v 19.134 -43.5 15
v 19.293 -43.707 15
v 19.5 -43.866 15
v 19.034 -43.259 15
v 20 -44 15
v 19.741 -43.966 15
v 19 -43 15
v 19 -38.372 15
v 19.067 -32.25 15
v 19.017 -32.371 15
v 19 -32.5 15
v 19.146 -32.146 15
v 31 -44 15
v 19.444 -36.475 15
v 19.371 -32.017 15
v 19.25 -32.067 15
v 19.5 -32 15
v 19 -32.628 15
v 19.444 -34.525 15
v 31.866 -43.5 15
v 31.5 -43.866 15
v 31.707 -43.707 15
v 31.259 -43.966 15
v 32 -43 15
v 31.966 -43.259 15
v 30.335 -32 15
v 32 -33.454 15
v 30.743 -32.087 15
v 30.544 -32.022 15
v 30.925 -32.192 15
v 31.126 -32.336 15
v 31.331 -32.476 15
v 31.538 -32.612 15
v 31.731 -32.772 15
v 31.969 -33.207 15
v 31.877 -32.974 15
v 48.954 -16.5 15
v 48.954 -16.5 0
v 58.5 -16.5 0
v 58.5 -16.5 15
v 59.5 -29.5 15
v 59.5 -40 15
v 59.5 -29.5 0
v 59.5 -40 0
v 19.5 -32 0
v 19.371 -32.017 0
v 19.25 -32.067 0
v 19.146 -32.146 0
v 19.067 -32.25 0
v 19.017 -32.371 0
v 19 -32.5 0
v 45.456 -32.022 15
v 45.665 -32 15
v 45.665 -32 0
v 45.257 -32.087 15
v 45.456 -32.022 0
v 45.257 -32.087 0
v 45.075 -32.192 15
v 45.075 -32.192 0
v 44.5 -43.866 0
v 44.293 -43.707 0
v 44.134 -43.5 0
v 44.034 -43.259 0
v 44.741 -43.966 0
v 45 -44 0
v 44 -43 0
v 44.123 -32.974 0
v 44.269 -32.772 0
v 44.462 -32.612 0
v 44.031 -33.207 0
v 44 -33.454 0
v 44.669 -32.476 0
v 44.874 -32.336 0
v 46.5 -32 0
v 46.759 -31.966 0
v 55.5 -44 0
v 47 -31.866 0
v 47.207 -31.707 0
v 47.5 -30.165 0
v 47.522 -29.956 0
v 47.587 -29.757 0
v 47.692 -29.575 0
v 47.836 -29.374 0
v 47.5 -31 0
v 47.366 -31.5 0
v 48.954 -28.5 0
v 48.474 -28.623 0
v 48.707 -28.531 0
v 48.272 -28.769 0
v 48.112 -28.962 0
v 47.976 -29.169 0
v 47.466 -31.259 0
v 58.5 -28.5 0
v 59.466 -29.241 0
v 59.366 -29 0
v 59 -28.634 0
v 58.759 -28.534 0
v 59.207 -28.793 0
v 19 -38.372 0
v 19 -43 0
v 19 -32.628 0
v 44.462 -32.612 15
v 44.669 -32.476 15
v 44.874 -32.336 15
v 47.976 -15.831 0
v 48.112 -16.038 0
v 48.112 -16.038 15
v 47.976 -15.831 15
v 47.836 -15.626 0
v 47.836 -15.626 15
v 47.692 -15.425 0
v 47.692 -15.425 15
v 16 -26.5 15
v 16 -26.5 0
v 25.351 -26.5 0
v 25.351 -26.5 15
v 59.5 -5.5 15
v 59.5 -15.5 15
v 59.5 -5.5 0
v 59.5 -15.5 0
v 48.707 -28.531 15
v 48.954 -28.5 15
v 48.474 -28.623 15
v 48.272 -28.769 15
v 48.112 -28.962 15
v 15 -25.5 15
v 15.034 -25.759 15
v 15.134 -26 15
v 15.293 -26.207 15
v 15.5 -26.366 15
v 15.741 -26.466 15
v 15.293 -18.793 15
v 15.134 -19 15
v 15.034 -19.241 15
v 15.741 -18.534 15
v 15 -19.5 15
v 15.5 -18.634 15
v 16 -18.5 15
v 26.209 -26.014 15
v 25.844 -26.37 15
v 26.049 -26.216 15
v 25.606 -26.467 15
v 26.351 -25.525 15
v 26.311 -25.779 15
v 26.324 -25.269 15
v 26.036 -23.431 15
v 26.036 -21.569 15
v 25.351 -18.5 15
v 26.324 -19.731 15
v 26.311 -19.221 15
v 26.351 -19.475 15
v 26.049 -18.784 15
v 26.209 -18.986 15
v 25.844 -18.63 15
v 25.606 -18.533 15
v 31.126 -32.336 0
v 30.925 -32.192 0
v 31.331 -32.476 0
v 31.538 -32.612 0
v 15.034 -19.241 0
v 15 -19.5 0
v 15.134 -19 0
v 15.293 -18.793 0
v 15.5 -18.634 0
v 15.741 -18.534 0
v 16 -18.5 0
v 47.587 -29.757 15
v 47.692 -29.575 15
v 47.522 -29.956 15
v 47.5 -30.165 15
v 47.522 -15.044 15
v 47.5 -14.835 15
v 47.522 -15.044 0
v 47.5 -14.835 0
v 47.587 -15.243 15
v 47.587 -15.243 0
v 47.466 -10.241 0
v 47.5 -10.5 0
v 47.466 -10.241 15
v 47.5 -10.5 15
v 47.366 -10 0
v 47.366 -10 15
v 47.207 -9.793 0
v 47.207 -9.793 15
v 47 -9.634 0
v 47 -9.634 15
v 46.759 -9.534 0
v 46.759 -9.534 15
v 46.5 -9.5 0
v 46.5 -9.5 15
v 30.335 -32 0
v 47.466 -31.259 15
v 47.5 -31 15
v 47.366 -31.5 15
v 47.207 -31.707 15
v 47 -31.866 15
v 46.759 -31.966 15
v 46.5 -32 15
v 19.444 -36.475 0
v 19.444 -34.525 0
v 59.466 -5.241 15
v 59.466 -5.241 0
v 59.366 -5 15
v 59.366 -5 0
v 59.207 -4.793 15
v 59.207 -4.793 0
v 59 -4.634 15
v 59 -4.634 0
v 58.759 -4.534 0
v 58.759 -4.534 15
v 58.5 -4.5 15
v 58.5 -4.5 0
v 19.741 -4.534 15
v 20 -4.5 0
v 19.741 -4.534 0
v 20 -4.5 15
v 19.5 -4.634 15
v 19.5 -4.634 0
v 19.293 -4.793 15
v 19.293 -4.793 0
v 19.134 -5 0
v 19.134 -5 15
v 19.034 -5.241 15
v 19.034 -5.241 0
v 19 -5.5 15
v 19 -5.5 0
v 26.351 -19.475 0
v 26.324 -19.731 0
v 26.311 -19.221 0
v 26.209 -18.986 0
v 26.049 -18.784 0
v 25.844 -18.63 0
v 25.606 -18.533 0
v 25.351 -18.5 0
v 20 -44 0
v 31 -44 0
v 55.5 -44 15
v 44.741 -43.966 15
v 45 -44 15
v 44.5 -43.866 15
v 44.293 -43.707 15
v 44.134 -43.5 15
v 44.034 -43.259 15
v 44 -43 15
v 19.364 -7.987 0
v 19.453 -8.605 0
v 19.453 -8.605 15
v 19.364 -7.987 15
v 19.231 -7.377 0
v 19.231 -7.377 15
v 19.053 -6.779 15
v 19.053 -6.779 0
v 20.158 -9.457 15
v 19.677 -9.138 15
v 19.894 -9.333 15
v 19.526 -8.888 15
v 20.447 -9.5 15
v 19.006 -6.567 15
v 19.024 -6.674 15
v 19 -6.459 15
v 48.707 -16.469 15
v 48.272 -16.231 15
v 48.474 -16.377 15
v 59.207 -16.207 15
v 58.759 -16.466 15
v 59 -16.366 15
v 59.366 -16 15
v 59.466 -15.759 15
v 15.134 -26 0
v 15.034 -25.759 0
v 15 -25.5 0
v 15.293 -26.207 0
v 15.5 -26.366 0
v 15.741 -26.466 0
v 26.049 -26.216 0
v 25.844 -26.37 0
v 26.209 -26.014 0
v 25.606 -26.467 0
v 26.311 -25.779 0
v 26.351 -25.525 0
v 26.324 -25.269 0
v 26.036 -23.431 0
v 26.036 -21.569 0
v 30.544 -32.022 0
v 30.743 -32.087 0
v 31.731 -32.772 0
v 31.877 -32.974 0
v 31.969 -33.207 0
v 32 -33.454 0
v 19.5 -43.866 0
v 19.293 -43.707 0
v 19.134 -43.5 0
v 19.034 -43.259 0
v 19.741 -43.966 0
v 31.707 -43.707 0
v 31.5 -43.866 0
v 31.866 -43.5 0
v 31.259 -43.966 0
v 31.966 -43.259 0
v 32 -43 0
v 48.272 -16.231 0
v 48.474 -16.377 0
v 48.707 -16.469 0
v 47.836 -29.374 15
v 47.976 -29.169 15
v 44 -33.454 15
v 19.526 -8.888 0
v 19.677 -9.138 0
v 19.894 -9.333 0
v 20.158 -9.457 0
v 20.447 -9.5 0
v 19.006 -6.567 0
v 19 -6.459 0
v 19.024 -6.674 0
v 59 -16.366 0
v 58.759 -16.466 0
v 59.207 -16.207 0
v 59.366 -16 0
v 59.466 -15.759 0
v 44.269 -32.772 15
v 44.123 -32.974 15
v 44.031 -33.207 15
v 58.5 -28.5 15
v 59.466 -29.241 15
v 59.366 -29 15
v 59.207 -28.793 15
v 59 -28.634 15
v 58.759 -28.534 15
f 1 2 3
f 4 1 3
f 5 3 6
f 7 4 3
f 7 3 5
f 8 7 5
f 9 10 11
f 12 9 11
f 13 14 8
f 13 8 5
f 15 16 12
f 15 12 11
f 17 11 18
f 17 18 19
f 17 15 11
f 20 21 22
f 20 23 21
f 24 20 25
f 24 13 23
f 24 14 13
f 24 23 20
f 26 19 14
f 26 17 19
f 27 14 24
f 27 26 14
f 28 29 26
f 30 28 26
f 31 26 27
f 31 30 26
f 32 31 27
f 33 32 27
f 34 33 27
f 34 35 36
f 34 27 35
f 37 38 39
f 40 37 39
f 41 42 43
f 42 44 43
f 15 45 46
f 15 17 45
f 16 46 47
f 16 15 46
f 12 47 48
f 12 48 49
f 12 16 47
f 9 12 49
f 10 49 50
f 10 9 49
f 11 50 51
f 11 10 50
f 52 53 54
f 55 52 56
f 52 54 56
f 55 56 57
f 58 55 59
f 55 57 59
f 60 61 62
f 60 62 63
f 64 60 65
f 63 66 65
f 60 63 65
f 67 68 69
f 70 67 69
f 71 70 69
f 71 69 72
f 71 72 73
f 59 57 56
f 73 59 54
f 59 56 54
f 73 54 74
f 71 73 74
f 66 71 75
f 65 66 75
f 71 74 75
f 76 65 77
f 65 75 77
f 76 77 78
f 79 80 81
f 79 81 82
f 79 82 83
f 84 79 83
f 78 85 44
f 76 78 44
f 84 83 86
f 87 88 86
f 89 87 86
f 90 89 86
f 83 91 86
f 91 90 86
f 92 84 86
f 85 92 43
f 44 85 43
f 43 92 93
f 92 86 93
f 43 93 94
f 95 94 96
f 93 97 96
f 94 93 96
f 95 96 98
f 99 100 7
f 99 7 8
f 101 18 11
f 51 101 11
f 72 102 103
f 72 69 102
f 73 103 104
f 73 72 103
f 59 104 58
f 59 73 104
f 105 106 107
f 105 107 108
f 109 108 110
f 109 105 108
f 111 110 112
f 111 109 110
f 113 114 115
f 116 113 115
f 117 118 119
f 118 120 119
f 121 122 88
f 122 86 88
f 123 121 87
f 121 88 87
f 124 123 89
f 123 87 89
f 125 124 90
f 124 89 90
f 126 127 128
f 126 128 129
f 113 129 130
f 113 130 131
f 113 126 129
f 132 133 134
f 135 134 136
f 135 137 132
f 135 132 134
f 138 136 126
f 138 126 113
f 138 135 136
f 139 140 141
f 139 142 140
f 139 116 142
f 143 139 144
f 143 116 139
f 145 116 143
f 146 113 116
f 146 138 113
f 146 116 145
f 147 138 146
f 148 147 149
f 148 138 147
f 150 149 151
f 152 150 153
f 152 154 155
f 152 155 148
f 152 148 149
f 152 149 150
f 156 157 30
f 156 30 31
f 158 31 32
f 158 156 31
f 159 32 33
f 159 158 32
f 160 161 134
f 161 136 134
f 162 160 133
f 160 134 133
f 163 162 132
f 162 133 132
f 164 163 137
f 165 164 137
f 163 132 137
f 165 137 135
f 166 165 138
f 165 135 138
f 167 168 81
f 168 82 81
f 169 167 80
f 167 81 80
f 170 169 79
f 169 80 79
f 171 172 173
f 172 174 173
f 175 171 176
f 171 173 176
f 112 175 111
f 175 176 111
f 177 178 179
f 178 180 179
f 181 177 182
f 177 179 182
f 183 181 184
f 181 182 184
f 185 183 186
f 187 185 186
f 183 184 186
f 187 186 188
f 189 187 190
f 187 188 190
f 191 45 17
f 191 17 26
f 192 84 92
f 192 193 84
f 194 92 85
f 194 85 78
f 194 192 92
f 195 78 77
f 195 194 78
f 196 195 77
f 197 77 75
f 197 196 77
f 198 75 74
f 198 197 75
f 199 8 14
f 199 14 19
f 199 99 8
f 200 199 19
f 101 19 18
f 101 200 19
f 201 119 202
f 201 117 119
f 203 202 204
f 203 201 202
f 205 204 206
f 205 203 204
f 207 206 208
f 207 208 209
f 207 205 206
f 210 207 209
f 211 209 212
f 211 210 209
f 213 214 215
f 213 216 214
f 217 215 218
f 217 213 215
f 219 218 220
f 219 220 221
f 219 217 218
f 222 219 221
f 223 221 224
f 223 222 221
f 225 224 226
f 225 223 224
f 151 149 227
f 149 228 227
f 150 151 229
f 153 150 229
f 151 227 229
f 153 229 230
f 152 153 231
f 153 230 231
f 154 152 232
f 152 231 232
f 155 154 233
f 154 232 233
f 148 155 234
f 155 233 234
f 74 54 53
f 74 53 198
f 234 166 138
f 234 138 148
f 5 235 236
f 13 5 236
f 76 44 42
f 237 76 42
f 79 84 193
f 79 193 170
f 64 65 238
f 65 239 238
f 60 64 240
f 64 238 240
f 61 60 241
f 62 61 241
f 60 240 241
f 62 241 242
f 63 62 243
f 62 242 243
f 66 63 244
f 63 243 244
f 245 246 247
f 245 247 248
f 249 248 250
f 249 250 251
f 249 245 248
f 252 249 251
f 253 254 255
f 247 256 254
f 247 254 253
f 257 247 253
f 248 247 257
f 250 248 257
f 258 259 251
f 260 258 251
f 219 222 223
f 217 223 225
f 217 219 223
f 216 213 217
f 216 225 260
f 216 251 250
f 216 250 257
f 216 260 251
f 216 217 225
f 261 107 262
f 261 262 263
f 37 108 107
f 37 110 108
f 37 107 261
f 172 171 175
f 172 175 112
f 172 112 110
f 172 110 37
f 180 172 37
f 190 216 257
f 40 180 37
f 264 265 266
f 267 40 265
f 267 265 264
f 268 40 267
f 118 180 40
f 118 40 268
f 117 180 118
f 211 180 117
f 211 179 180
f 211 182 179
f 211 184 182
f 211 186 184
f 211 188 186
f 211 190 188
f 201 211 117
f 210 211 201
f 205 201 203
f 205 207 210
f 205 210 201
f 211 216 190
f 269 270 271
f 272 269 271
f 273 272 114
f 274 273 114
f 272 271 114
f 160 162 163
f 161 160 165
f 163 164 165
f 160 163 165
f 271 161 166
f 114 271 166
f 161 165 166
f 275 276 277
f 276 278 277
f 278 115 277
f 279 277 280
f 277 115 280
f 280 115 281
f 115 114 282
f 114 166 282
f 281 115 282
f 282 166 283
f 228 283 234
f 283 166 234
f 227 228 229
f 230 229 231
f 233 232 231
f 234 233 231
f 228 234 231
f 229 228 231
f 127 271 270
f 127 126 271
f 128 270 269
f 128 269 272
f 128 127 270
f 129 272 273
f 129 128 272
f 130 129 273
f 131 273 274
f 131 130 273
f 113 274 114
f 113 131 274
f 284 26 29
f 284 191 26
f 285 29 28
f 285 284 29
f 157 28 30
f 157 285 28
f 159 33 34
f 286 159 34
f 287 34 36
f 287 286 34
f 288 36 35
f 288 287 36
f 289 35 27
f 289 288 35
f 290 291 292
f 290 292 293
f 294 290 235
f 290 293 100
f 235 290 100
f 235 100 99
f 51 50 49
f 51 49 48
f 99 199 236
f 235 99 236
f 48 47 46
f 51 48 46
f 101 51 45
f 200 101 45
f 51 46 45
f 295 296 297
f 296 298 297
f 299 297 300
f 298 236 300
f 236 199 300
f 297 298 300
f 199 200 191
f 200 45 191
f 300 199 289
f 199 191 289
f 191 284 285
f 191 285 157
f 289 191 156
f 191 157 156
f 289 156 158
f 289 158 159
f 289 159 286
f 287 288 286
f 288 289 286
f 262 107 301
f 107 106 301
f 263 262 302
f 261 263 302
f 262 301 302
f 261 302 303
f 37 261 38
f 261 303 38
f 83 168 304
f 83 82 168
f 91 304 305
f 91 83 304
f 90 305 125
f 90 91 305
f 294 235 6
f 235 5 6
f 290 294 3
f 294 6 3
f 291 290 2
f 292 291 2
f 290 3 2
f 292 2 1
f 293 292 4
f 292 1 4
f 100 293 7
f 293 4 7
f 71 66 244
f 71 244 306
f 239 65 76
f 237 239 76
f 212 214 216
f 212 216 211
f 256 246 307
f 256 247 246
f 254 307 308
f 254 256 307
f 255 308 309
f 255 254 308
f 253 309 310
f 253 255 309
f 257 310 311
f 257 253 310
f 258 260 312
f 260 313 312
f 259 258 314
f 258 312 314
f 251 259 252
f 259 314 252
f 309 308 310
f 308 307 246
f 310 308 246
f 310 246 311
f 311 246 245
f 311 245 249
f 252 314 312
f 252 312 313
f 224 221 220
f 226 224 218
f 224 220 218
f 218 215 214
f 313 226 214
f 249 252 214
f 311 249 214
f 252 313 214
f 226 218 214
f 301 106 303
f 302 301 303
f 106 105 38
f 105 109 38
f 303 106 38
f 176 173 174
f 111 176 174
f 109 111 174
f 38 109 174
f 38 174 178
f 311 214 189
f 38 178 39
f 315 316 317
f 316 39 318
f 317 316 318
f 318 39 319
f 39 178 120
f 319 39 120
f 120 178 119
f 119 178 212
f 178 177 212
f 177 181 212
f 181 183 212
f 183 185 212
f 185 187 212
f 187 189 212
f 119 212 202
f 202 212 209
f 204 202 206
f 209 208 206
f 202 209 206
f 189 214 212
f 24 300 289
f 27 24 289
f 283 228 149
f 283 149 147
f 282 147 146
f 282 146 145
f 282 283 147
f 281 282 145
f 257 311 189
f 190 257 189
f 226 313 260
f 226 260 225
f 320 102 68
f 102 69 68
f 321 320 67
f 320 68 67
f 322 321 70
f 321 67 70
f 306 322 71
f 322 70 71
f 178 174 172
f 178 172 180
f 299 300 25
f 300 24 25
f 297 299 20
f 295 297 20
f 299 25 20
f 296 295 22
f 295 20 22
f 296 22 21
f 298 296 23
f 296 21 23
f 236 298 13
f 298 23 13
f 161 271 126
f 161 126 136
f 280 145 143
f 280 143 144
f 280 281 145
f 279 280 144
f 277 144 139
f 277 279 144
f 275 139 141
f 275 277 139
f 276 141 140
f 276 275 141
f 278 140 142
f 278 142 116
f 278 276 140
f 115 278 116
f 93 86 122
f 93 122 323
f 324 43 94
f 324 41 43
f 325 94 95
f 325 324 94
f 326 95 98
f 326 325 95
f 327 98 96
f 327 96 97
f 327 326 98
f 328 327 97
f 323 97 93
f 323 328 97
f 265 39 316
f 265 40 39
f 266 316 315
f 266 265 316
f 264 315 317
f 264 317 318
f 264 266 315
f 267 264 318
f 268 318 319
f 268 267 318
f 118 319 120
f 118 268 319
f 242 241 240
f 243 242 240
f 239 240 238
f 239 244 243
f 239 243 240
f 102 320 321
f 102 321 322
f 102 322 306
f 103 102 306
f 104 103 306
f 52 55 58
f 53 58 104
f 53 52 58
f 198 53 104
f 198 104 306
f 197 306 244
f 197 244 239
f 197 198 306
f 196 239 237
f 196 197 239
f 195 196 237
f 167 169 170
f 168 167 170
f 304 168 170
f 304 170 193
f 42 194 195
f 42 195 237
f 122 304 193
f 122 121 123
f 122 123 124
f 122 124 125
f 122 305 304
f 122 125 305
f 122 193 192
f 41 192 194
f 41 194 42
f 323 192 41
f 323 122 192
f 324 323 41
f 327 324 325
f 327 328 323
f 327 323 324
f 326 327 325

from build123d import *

# Parameters (mm, degrees)
CYLINDER069_R     = 8.5
CYLINDER069_DEPTH = 15
CYLINDER071_R     = 8.5
CYLINDER071_DEPTH = 15
CYLINDER070_R     = 12
CYLINDER070_DEPTH = 15
BOX015_W          = 12
BOX015_H          = 7
BOX015_DEPTH      = 15
BOX014_W          = 12
BOX014_H          = 3.5
BOX014_DEPTH      = 15
BOX012_W          = 15.5
BOX012_H          = 12
BOX012_DEPTH      = 15
CHAMFER012_SIZE   = 4
BOX011_W          = 13
BOX011_H          = 12
BOX011_DEPTH      = 15
BOX016_W          = 14.5
BOX016_H          = 8
BOX016_DEPTH      = 15
BOX013_W          = 40.5
BOX013_H          = 5
BOX013_DEPTH      = 15
FILLET003_R       = 0.5
FILLET004_R       = 1


with BuildPart() as cylinder069:
    # Cylinder069 → Cylinder069 (new body)
    with BuildSketch(Plane(origin=(11, -35.5, 0), x_dir=(1, 0, 0), z_dir=(0, 0, 1))):
        Circle(CYLINDER069_R)
    extrude(amount=CYLINDER069_DEPTH)


with BuildPart() as cylinder071:
    # Cylinder071 → Cylinder071 (new body)
    with BuildSketch(Plane(origin=(11, -9.5, 0), x_dir=(1, 0, 0), z_dir=(0, 0, 1))):
        Circle(CYLINDER071_R)
    extrude(amount=CYLINDER071_DEPTH)


with BuildPart() as fusion006002011004053036004001003011:
    # Cylinder070 → Cylinder070 (new body)
    with BuildSketch(Plane(origin=(38, -22.5, 0), x_dir=(1, 0, 0), z_dir=(0, 0, 1))):
        Circle(CYLINDER070_R)
    extrude(amount=CYLINDER070_DEPTH)

    # Fusion006002011004053036004001003011: union Cylinder069, Cylinder071
    add(cylinder069.part)
    add(cylinder071.part)


with BuildPart() as cube015:
    # Box015 → Box015 (new body)
    with BuildSketch(Plane(origin=(47.5, -16.5, 0), x_dir=(1, 0, 0), z_dir=(0, 0, 1))):
        with Locations((6, 3.5)):
            Rectangle(BOX015_W, BOX015_H)
    extrude(amount=BOX015_DEPTH)


with BuildPart() as cube014:
    # Box014 → Box014 (new body)
    with BuildSketch(Plane(origin=(47.5, -32, 0), x_dir=(1, 0, 0), z_dir=(0, 0, 1))):
        with Locations((6, 1.75)):
            Rectangle(BOX014_W, BOX014_H)
    extrude(amount=BOX014_DEPTH)


with BuildPart() as chamfer012:
    # Box012 → Box012 (new body)
    with BuildSketch(Plane(origin=(44, -44, 0), x_dir=(1, 0, 0), z_dir=(0, 0, 1))):
        with Locations((7.75, 6)):
            Rectangle(BOX012_W, BOX012_H)
    extrude(amount=BOX012_DEPTH)

    # Chamfer012
    chamfer012_edges = [chamfer012.edges().sort_by_distance(p)[0] for p in [
        (59.5, -44, 7.5),
    ]]
    chamfer(chamfer012_edges, length=CHAMFER012_SIZE)


with BuildPart() as cube011:
    # Box011 → Box011 (new body)
    with BuildSketch(Plane(origin=(19, -44, 0), x_dir=(1, 0, 0), z_dir=(0, 0, 1))):
        with Locations((6.5, 6)):
            Rectangle(BOX011_W, BOX011_H)
    extrude(amount=BOX011_DEPTH)


with BuildPart() as cube016:
    # Box016 → Box016 (new body)
    with BuildSketch(Plane(origin=(15, -26.5, 0), x_dir=(1, 0, 0), z_dir=(0, 0, 1))):
        with Locations((7.25, 4)):
            Rectangle(BOX016_W, BOX016_H)
    extrude(amount=BOX016_DEPTH)


with BuildPart() as wall:
    # Box013 → Box013 (new body)
    with BuildSketch(Plane(origin=(19, -9.5, 0), x_dir=(1, 0, 0), z_dir=(0, 0, 1))):
        with Locations((20.25, 2.5)):
            Rectangle(BOX013_W, BOX013_H)
    extrude(amount=BOX013_DEPTH)

    # Fusion006002011004053036004001003012: union Cube015, Cube014, Chamfer012, Cube011, Cube016
    add(cube015.part)
    add(cube014.part)
    add(chamfer012.part)
    add(cube011.part)
    add(cube016.part)

    # Cut002008008: cut Fusion006002011004053036004001003011
    add(fusion006002011004053036004001003011.part, mode=Mode.SUBTRACT)

    # Fillet003
    fillet003_edges = [wall.edges().sort_by_distance(p)[0] for p in [
        (19, -32, 7.5),
    ]]
    fillet(fillet003_edges, radius=FILLET003_R)

    # Fillet004
    fillet004_edges = [wall.edges().sort_by_distance(p)[0] for p in [
        (30.668561, -32, 7.5),
        (32, -32.892305, 7.5),
        (19, -44, 7.5),
        (32, -44, 7.5),
        (19, -4.5, 7.5),
        (19, -6.627719, 7.5),
        (59.5, -4.5, 7.5),
        (19.5, -9.5, 7.5),
        (47.5, -9.5, 7.5),
        (59.5, -16.5, 7.5),
        (47.5, -15.168561, 7.5),
        (48.392305, -16.5, 7.5),
        (47.5, -29.831439, 7.5),
        (47.5, -32, 7.5),
        (48.392305, -28.5, 7.5),
        (45.331439, -32, 7.5),
        (59.5, -28.5, 7.5),
        (44, -32.892305, 7.5),
        (44, -44, 7.5),
        (15, -26.5, 7.5),
        (15, -18.5, 7.5),
        (26.686292, -26.5, 7.5),
        (26.686292, -18.5, 7.5),
    ]]
    fillet(fillet004_edges, radius=FILLET004_R)


solid = wall.part
